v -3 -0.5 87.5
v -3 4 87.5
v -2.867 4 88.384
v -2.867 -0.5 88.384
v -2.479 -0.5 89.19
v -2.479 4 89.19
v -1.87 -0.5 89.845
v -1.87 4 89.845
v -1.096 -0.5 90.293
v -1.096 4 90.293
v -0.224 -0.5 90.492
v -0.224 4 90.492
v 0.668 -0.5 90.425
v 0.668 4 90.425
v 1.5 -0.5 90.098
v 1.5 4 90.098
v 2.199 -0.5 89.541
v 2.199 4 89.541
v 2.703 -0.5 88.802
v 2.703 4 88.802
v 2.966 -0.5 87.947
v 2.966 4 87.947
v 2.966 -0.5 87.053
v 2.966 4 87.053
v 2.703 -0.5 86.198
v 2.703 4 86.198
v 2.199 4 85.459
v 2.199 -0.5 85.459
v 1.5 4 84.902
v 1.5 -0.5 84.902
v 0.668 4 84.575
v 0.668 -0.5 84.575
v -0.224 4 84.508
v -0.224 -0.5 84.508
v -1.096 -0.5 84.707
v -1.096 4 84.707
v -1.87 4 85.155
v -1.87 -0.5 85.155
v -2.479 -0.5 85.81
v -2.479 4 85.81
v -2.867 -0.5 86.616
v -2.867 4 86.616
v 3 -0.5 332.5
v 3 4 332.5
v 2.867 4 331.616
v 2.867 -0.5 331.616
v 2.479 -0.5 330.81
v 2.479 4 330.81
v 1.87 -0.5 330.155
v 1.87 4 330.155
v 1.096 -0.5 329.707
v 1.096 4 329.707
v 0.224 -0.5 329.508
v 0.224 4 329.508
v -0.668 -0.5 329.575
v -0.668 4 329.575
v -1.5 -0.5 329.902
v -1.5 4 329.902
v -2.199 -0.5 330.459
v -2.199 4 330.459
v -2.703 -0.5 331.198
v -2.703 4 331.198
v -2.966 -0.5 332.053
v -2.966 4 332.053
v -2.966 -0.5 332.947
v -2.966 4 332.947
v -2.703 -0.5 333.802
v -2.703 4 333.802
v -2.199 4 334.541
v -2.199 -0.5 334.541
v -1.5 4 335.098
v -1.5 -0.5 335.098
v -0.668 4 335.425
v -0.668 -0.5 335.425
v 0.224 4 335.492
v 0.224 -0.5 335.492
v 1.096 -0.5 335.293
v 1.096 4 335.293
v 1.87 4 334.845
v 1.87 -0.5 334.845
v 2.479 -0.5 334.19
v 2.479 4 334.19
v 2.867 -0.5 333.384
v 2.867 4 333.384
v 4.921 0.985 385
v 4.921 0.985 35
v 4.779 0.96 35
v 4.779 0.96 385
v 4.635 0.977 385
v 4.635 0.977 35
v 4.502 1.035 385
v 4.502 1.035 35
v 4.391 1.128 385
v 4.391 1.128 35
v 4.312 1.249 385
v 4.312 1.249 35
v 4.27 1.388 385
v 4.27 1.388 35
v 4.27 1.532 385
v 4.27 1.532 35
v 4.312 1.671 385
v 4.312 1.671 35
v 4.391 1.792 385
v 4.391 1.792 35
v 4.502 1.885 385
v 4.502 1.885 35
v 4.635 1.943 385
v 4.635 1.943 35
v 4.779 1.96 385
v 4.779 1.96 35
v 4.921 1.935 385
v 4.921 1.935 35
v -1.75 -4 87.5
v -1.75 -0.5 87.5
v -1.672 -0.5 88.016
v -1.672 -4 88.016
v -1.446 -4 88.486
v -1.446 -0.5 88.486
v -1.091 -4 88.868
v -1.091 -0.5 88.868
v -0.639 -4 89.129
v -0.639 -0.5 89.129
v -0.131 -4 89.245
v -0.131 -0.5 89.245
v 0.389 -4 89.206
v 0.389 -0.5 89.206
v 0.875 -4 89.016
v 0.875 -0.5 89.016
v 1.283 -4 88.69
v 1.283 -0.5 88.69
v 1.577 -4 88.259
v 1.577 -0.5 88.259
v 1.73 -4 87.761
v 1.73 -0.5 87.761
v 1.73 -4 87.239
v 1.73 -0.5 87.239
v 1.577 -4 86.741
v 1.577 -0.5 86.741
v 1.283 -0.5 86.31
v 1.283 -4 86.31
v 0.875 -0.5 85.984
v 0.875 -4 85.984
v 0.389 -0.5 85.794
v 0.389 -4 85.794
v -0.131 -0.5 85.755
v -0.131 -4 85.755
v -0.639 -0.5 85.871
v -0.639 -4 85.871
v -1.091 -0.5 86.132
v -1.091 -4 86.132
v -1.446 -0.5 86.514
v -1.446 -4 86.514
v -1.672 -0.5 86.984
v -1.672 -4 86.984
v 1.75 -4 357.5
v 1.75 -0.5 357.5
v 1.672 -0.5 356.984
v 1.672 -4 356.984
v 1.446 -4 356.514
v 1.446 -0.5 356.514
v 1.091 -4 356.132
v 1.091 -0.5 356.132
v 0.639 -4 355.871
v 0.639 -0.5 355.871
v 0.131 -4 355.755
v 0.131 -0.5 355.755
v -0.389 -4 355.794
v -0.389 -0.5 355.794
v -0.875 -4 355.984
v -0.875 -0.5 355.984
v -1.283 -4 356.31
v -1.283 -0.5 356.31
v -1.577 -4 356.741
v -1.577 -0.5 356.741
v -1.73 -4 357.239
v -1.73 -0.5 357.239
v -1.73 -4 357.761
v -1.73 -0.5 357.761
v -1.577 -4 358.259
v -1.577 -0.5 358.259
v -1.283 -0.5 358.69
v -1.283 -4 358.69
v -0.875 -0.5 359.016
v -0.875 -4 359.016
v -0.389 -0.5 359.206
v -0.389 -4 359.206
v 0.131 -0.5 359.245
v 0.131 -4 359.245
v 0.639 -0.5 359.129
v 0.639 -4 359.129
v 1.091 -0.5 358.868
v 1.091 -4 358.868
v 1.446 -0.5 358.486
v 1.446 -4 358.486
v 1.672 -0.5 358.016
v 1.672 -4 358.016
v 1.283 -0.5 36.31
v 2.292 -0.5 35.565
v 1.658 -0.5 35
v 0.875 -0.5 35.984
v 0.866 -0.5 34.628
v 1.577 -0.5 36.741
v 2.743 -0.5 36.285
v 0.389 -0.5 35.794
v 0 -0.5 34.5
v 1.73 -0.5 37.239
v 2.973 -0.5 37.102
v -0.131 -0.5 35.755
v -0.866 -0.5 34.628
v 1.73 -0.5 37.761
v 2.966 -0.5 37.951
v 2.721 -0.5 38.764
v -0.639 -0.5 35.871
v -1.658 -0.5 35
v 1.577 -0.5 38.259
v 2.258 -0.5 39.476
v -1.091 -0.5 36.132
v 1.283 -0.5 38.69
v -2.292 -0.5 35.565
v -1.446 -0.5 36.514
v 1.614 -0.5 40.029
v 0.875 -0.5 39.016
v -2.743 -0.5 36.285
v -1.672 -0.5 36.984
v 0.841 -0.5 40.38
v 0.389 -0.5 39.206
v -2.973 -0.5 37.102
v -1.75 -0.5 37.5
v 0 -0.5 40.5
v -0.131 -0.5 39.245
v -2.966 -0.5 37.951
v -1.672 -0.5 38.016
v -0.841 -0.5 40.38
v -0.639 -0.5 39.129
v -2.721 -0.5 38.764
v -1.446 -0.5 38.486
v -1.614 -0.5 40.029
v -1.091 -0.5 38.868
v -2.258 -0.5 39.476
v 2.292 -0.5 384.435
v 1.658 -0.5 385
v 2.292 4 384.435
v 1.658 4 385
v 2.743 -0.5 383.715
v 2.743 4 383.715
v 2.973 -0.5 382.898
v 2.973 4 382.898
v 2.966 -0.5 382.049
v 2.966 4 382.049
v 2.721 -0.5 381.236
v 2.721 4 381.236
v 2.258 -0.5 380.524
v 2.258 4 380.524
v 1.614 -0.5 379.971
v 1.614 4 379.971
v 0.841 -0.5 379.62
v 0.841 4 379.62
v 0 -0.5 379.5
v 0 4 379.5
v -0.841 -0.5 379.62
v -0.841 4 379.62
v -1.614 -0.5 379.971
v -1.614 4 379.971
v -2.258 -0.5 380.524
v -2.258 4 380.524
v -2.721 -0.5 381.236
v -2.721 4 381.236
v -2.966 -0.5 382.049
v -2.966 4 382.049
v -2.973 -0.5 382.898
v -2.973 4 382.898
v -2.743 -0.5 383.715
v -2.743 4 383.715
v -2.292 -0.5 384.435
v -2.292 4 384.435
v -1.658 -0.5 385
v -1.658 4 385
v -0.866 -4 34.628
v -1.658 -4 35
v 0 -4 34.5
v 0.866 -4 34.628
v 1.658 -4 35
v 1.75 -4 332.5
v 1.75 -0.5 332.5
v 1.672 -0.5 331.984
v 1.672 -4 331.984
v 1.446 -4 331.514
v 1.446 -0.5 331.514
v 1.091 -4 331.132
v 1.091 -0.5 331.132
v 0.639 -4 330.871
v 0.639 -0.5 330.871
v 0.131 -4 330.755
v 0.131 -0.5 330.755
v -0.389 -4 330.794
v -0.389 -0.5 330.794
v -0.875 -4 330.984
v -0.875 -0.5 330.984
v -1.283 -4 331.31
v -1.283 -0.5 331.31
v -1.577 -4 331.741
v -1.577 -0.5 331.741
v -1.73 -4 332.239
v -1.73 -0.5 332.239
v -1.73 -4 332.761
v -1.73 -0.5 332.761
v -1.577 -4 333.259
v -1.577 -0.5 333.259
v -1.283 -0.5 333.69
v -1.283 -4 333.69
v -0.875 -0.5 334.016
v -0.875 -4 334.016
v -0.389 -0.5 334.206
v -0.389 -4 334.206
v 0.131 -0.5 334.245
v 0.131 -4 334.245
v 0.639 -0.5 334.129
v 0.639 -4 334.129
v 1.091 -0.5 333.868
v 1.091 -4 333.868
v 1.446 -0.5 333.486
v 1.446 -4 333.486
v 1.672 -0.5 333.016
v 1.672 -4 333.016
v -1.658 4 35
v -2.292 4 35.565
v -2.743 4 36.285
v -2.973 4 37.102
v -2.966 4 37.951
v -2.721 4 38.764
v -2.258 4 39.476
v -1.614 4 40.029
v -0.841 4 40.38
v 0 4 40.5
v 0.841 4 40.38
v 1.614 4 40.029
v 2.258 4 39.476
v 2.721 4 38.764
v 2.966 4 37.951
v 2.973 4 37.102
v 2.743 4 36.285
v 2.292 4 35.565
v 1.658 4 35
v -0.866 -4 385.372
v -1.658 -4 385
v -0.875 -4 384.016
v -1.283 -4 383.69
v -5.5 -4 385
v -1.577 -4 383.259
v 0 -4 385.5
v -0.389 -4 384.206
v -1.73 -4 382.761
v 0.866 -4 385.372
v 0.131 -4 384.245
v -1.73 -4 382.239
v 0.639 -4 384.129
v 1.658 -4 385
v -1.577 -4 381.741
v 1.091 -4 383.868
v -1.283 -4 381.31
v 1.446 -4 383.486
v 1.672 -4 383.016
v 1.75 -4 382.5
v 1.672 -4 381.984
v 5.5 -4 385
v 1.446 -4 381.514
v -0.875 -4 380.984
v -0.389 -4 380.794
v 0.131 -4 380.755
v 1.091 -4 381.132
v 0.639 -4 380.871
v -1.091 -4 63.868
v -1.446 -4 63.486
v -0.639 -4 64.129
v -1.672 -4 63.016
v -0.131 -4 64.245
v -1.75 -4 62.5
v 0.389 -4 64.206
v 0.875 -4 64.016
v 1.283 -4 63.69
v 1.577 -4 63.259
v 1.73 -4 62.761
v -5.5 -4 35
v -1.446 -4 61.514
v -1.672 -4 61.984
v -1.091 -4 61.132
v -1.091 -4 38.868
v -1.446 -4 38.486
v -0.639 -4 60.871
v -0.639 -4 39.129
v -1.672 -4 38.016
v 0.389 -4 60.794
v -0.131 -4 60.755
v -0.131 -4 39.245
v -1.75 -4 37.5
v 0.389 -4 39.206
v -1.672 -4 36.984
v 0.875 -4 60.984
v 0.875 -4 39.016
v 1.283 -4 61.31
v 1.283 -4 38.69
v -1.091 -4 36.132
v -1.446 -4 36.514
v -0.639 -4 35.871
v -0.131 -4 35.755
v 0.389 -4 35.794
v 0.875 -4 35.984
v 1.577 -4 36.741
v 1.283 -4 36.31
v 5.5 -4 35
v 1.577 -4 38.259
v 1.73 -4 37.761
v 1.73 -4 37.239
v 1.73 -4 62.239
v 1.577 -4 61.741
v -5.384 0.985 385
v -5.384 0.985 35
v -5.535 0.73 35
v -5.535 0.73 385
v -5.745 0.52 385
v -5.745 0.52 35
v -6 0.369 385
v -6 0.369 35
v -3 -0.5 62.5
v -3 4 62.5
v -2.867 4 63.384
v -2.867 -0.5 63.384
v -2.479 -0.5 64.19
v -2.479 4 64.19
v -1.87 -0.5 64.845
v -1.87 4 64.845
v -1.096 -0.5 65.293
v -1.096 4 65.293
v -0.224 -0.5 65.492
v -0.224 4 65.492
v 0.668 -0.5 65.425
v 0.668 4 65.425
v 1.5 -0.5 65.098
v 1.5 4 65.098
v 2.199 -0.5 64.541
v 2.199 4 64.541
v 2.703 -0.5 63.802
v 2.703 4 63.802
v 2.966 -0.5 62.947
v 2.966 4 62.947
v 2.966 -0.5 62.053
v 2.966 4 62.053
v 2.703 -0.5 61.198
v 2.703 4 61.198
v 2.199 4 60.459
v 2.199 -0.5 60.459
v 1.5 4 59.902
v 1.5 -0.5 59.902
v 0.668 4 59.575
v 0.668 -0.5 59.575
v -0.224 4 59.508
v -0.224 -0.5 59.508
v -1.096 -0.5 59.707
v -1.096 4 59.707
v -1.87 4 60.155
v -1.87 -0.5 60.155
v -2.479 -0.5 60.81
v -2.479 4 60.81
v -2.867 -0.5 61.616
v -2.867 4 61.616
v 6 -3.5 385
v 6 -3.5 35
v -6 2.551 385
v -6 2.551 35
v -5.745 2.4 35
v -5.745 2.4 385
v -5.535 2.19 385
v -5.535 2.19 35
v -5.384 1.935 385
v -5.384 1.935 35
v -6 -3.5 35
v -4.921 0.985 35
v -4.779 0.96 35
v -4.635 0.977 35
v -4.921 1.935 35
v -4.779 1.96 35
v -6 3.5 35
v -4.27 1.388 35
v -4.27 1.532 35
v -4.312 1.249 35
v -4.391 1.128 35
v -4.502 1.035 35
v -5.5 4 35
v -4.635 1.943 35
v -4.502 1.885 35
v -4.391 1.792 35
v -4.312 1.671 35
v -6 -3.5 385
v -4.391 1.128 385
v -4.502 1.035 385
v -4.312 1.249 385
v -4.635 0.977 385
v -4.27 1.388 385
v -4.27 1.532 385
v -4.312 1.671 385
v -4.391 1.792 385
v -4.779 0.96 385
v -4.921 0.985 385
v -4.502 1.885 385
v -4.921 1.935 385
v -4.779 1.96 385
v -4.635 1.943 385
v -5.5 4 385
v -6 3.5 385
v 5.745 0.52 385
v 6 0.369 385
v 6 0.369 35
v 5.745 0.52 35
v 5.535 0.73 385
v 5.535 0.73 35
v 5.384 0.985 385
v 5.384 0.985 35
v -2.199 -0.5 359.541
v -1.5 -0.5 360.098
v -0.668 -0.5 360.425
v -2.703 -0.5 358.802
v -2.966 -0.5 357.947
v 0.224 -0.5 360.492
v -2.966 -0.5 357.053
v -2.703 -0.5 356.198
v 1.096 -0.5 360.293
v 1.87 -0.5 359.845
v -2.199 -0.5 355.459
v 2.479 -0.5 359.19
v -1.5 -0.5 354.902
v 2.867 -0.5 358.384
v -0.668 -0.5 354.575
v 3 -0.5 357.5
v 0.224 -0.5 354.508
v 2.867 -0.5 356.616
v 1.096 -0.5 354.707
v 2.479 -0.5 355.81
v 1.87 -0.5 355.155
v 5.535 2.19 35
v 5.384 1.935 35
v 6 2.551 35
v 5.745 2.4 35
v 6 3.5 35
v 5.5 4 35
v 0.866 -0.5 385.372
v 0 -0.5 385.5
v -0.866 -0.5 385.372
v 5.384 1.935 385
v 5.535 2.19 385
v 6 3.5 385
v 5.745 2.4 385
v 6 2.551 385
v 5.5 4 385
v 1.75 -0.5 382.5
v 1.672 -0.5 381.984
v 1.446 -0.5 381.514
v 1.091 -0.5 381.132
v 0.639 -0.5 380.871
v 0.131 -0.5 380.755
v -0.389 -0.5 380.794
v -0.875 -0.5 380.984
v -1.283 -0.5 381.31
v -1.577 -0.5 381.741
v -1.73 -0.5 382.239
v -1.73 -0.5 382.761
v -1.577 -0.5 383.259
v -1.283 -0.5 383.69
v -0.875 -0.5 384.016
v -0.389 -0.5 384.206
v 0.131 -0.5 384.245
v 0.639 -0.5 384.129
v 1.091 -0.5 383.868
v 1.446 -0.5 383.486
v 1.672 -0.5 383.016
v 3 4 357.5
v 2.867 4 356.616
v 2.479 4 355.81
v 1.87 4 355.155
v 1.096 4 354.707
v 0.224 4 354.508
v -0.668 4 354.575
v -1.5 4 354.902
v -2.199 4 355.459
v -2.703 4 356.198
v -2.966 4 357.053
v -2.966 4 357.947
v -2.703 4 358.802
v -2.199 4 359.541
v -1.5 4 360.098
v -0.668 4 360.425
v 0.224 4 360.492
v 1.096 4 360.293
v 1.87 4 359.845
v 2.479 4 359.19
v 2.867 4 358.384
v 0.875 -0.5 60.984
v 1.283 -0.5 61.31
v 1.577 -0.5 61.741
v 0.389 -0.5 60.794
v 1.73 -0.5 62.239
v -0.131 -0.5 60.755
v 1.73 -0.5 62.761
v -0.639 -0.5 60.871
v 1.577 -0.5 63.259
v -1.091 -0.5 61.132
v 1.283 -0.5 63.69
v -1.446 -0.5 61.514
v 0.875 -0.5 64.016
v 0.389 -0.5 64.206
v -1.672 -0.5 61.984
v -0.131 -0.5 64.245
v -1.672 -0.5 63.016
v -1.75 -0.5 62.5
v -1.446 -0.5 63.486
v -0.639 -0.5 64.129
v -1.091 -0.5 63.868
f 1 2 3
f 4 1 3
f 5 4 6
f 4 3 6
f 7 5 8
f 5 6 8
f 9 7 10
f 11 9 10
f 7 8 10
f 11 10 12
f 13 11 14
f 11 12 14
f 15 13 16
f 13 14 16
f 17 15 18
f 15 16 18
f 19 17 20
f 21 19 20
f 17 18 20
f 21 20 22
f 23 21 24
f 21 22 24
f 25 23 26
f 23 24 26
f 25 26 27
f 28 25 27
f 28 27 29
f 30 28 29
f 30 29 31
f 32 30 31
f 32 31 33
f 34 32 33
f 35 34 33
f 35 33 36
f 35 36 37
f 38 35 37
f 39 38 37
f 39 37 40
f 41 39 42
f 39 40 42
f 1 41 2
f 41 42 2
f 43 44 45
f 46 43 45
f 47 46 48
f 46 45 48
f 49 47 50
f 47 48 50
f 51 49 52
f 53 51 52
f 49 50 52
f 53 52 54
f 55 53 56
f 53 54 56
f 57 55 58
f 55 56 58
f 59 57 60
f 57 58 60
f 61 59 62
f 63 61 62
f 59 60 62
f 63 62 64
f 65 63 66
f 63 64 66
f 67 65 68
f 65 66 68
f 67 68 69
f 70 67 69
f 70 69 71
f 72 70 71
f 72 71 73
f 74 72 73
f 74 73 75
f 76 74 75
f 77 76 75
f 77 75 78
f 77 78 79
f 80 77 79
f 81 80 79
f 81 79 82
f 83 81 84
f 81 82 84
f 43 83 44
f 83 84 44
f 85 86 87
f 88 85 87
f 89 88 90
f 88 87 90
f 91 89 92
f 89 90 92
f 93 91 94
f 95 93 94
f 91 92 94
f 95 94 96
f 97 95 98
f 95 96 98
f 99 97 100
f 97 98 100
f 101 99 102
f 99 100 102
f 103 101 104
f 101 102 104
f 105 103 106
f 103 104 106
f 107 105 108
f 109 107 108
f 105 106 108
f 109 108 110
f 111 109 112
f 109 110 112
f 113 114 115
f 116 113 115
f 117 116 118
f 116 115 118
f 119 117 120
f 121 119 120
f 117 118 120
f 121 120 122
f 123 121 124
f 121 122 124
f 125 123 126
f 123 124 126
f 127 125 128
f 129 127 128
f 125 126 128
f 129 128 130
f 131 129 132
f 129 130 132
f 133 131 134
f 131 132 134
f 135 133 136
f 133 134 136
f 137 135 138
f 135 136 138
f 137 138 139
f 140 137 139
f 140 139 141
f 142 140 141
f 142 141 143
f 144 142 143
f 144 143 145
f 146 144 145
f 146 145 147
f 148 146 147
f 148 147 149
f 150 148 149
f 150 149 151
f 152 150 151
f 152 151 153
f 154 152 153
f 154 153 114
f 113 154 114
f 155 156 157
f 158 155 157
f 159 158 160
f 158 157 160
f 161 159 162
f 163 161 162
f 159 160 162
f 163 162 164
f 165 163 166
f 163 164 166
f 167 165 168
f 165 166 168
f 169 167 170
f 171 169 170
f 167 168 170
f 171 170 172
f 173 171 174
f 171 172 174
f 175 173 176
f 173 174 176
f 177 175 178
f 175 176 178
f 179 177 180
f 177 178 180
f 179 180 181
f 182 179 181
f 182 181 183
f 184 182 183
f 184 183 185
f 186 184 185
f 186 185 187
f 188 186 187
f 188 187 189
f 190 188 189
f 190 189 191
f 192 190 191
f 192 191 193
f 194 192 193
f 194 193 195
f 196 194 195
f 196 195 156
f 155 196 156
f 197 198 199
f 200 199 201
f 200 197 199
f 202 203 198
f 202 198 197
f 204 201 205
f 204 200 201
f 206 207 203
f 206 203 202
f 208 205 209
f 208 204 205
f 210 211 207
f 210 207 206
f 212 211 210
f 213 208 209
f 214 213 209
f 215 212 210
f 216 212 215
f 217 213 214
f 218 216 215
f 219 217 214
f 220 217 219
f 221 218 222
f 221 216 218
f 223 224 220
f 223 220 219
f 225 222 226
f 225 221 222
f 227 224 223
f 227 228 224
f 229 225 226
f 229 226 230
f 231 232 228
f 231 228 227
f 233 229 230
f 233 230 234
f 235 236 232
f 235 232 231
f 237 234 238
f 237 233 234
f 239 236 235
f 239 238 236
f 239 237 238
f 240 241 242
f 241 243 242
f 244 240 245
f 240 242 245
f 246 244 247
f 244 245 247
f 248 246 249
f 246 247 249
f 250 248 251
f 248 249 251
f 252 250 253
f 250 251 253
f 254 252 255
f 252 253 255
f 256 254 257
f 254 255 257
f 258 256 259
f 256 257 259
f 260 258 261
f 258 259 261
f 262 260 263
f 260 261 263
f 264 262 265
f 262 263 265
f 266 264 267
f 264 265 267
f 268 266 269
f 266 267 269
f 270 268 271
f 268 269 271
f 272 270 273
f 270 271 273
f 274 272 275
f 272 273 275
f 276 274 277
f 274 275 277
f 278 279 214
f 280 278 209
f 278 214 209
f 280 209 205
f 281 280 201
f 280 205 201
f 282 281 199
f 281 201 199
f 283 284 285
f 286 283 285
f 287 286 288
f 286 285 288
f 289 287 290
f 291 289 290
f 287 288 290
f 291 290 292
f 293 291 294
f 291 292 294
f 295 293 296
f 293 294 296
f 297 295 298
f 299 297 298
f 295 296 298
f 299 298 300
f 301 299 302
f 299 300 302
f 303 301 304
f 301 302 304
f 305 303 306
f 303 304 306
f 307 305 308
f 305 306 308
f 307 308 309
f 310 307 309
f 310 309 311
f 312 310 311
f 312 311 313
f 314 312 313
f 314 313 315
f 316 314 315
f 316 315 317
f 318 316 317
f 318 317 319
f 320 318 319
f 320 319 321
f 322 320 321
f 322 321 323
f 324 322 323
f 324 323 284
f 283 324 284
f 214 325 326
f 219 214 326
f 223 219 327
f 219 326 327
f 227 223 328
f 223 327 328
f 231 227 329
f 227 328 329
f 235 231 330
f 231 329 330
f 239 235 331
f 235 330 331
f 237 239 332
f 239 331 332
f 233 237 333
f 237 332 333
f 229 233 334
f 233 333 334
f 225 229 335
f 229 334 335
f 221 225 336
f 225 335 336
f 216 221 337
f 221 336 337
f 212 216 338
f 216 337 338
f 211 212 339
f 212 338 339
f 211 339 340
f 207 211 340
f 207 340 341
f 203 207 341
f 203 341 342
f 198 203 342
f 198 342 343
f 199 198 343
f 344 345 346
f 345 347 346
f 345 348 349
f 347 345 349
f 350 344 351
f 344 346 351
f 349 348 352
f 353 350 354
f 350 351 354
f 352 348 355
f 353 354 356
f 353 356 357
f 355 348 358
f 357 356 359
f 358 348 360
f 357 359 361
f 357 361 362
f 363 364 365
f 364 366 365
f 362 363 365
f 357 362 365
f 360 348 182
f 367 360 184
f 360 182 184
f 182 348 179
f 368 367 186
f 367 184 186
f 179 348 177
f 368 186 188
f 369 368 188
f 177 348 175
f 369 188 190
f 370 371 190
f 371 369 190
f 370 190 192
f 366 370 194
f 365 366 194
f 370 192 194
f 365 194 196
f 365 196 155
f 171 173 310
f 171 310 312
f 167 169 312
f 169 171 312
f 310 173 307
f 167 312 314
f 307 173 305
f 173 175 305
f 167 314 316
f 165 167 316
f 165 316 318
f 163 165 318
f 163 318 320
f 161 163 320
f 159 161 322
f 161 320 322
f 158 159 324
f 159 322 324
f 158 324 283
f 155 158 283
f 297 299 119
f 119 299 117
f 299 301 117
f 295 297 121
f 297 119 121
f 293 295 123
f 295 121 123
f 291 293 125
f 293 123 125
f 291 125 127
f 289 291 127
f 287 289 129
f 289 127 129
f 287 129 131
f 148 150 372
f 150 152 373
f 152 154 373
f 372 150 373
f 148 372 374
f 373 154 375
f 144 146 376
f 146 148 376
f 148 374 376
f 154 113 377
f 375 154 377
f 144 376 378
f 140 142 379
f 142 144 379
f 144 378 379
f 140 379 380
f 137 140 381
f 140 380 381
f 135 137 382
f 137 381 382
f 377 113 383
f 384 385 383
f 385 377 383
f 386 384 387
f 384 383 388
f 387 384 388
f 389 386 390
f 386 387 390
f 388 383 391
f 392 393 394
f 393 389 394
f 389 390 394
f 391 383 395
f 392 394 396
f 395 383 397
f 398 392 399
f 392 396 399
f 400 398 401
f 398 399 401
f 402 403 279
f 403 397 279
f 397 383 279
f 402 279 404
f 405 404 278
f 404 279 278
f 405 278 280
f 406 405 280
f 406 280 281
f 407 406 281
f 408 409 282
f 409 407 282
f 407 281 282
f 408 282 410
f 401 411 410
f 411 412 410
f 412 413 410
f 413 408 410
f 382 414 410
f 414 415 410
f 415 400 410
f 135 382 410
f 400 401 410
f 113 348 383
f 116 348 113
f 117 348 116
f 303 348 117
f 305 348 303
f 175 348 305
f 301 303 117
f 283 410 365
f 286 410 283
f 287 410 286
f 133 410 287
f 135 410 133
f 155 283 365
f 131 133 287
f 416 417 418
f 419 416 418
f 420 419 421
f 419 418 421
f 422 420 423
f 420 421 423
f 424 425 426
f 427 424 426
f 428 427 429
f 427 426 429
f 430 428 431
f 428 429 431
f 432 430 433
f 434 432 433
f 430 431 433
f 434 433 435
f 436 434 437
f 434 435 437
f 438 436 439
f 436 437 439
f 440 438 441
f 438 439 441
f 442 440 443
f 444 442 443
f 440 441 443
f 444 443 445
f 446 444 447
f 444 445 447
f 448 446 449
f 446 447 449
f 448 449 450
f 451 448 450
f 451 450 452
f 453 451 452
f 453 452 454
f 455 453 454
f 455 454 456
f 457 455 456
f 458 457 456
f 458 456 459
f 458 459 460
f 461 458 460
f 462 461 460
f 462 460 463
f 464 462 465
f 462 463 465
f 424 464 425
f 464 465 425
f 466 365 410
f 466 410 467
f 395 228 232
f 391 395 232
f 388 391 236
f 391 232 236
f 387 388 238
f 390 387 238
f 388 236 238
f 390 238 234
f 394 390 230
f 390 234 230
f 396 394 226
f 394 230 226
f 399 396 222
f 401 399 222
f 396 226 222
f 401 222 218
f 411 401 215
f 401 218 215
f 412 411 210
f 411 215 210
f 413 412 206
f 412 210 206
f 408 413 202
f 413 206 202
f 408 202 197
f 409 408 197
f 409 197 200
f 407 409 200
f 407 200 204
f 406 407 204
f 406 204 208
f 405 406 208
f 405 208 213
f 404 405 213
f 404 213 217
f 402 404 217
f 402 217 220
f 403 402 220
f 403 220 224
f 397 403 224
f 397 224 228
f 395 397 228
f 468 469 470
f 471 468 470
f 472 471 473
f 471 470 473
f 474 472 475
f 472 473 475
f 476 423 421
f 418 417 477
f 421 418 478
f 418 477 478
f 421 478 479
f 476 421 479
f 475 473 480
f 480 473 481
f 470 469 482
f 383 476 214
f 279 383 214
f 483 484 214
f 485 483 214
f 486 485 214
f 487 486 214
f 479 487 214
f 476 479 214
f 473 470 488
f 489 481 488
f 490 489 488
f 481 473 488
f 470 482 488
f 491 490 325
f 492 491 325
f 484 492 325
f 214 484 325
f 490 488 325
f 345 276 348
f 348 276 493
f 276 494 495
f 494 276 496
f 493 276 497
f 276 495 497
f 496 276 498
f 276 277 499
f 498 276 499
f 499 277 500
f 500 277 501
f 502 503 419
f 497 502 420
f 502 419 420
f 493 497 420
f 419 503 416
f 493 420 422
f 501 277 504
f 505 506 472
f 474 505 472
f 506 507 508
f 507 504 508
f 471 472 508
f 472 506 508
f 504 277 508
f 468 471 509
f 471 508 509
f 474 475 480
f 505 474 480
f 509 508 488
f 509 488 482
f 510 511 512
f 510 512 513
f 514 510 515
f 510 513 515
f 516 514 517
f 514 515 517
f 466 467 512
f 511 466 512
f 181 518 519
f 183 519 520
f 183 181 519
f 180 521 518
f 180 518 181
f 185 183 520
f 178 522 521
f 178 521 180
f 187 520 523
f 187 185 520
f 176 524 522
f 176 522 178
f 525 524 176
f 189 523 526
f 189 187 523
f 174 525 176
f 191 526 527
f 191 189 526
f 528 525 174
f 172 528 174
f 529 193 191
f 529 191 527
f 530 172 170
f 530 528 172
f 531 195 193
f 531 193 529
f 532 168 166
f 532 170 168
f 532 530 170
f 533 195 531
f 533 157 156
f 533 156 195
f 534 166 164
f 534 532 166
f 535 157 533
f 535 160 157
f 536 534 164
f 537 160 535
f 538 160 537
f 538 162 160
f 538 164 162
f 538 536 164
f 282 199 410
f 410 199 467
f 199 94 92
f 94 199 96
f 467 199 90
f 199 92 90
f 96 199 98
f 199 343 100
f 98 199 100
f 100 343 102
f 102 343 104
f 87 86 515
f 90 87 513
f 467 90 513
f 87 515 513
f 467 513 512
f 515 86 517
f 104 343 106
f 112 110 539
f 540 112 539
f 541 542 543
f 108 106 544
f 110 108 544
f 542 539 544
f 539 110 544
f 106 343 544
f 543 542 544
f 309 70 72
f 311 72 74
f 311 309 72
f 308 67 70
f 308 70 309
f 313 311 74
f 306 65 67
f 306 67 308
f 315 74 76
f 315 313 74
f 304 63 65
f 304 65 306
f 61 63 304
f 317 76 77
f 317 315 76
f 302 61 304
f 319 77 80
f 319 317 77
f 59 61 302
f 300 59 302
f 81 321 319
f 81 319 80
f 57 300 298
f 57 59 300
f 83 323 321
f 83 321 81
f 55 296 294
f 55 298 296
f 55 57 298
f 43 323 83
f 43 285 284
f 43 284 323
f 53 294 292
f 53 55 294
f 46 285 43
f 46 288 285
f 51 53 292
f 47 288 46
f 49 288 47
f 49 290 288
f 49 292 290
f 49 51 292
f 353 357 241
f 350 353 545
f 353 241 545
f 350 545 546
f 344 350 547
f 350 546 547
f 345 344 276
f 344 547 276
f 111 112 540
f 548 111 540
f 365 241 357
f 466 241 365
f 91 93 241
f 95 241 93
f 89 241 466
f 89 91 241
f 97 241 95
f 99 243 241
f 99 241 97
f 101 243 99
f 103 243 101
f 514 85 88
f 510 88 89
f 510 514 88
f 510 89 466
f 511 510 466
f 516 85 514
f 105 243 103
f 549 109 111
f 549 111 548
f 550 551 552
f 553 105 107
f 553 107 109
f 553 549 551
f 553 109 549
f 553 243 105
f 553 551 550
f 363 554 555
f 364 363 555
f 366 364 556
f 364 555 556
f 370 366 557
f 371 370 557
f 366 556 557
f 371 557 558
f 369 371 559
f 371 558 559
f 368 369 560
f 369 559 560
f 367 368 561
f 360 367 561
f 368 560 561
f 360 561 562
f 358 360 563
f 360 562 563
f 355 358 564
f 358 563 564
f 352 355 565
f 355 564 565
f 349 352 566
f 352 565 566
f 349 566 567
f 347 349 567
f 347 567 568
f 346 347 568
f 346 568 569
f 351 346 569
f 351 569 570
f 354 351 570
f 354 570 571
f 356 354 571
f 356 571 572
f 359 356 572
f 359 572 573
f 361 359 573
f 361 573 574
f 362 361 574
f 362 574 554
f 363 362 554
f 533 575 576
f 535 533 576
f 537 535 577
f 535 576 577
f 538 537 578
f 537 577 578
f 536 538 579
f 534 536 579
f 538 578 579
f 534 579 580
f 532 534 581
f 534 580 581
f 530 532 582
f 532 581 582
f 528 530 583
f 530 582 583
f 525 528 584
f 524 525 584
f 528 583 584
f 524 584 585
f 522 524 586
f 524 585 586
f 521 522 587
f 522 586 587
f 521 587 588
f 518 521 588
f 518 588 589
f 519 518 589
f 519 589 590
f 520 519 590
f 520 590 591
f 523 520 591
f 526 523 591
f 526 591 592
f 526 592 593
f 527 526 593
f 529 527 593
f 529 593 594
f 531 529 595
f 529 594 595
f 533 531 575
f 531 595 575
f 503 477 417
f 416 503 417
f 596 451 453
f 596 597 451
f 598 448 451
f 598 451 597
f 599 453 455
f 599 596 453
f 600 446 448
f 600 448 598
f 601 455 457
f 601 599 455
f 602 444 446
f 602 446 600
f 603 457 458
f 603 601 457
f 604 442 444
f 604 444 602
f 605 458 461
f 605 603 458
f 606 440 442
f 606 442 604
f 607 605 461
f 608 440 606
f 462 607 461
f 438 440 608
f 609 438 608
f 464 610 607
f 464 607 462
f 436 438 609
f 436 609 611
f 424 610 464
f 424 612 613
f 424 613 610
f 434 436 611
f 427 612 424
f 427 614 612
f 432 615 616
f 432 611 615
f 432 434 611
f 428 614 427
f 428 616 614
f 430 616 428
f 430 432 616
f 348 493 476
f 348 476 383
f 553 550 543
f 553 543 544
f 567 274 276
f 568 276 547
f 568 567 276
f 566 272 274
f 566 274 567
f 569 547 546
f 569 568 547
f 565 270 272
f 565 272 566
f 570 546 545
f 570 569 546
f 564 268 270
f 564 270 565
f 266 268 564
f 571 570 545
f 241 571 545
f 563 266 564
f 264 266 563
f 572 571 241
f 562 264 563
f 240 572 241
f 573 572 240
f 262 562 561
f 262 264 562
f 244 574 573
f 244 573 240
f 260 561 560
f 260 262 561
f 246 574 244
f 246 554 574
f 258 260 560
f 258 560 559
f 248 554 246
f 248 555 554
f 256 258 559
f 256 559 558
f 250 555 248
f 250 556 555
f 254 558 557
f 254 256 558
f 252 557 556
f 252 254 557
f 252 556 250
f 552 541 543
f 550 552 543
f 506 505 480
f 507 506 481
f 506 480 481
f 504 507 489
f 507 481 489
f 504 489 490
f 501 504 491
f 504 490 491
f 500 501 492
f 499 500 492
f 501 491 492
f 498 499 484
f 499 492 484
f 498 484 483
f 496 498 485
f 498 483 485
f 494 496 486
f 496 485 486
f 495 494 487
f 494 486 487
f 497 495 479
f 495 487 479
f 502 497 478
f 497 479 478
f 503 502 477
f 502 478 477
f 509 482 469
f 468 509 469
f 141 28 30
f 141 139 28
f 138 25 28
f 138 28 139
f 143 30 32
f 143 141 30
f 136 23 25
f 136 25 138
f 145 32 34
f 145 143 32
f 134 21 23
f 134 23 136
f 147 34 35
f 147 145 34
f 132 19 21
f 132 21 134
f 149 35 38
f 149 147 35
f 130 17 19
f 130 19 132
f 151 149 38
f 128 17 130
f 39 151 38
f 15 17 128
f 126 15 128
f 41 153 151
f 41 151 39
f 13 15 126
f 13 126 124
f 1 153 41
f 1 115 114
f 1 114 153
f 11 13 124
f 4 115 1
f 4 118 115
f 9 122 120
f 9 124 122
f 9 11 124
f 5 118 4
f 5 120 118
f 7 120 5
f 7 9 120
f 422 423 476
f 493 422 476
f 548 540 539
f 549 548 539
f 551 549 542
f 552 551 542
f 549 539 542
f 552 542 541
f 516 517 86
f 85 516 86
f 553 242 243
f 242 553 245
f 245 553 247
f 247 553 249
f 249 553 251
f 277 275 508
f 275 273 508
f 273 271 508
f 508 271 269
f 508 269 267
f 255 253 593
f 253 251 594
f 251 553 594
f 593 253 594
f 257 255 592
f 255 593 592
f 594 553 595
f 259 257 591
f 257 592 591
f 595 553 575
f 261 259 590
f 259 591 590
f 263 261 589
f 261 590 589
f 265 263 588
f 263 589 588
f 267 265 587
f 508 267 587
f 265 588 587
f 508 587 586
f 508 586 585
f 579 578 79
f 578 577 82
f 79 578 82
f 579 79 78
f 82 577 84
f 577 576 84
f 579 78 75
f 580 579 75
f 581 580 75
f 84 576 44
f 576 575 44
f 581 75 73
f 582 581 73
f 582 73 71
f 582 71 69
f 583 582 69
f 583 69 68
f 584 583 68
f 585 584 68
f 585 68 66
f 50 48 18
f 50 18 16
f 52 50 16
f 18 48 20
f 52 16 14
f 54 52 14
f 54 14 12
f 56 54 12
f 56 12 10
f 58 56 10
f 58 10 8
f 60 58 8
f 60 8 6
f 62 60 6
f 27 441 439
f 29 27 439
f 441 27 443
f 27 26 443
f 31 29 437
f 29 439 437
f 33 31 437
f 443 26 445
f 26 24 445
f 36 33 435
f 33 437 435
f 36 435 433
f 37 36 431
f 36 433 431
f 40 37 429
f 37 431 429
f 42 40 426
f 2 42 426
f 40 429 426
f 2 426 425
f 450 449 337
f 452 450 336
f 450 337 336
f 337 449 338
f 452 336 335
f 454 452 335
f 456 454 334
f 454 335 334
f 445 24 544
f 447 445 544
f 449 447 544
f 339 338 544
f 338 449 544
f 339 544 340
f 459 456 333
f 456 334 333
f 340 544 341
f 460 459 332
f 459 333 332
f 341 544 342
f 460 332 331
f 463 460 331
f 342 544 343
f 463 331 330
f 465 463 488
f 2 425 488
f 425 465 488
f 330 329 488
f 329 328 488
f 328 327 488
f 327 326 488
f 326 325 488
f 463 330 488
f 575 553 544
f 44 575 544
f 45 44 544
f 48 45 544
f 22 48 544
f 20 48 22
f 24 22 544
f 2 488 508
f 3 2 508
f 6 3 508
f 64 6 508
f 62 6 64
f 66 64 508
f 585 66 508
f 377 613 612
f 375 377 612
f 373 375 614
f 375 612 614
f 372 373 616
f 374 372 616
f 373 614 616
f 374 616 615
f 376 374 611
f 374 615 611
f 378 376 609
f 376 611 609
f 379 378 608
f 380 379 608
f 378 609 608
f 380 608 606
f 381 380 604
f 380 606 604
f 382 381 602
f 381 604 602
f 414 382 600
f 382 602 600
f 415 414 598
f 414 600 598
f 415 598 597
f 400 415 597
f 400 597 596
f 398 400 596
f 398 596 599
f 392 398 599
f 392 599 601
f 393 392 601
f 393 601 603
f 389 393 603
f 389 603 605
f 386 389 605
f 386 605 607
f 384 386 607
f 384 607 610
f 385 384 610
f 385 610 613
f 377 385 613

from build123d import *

# Parameters (mm, degrees)
BOSS_EXTRUDE1_DEPTH     = 420
SKETCH2_R               = 3
CUT_EXTRUDE1_DEPTH      = 4.5
SKETCH3_R               = 1.75
CUT_EXTRUDE2_DEPTH      = 421.066958948
LPATTERN1_COUNT         = 4
LPATTERN1_PITCH         = 25
MIRROR1_COPY_1_SKETCH_R = 3
MIRROR1_COPY_1_DEPTH    = 4.5
MIRROR1_COPY_2_SKETCH_R = 3
MIRROR1_COPY_2_DEPTH    = 4.5
MIRROR1_COPY_3_SKETCH_R = 3
MIRROR1_COPY_3_DEPTH    = 4.5
MIRROR1_COPY_4_SKETCH_R = 1.75
MIRROR1_COPY_4_DEPTH    = 421.066958948
MIRROR1_COPY_5_SKETCH_R = 1.75
MIRROR1_COPY_5_DEPTH    = 421.066958948
MIRROR1_COPY_6_SKETCH_R = 1.75
MIRROR1_COPY_6_DEPTH    = 421.066958948
SKETCH5_R               = 3
SKETCH5_W               = 0.5
SKETCH5_H               = 35
CUT_EXTRUDE3_DEPTH      = 421.119030752


with BuildPart() as part:
    # Sketch1 → Boss-Extrude1 (new body)
    with BuildSketch(Plane.XY):
        with BuildLine():
            Line((6, -3.5), (6, 0.368911094))
            ThreePointArc((6, 0.368911094), (5.63354293, 0.61854293), (5.383911094, 0.985))
            Line((5.383911094, 0.985), (4.92112495, 0.985))
            ThreePointArc((4.92112495, 0.985), (4.265, 1.46), (4.92112495, 1.935))
            Line((4.92112495, 1.935), (5.383911094, 1.935))
            ThreePointArc((5.383911094, 1.935), (5.63354293, 2.30145707), (6, 2.551088906))
            Line((6, 2.551088906), (6, 3.5))
            Line((6, 3.5), (5.5, 4))
            Line((5.5, 4), (-5.5, 4))
            Line((-5.5, 4), (-6, 3.5))
            Line((-6, 3.5), (-6, 2.551088906))
            ThreePointArc((-6, 2.551088906), (-5.63354293, 2.30145707), (-5.383911094, 1.935))
            Line((-5.383911094, 1.935), (-4.92112495, 1.935))
            ThreePointArc((-4.92112495, 1.935), (-4.265, 1.46), (-4.92112495, 0.985))
            Line((-4.92112495, 0.985), (-5.383911094, 0.985))
            ThreePointArc((-5.383911094, 0.985), (-5.63354293, 0.61854293), (-6, 0.368911094))
            Line((-6, 0.368911094), (-6, -3.5))
            Line((-6, -3.5), (-5.5, -4))
            Line((-5.5, -4), (5.5, -4))
            Line((5.5, -4), (6, -3.5))
        make_face()
    extrude(amount=BOSS_EXTRUDE1_DEPTH)

    # Sketch2 → Cut-Extrude1 (cut)
    with BuildSketch(Plane(origin=(0, 4, 0), x_dir=(1, 0, 0), z_dir=(0, 1, 0))):
        with Locations(Location((0, -12.5, 0), (0, 0, 180))):
            Circle(SKETCH2_R)
    cut_extrude1 = extrude(amount=-CUT_EXTRUDE1_DEPTH, mode=Mode.SUBTRACT)

    # Sketch3 → Cut-Extrude2 (cut, through all)
    with BuildSketch(Plane(origin=(0, -0.5, 0), x_dir=(1, 0, 0), z_dir=(0, 1, 0))):
        with Locations(Location((0, -12.5, 0), (0, 0, 180))):
            Circle(SKETCH3_R)
    cut_extrude2 = extrude(amount=-CUT_EXTRUDE2_DEPTH, mode=Mode.SUBTRACT)

    # LPattern1: Cut-Extrude1, Cut-Extrude2 ×4
    with Locations(*[(0, 0, i * LPATTERN1_PITCH) for i in range(1, LPATTERN1_COUNT)]):
        add(cut_extrude1, mode=Mode.SUBTRACT)
        add(cut_extrude2, mode=Mode.SUBTRACT)

    # Mirror1: Cut-Extrude1, Cut-Extrude2 across plane
    add(cut_extrude1.mirror(Plane.XY.offset(210)), mode=Mode.SUBTRACT)
    add(cut_extrude2.mirror(Plane.XY.offset(210)), mode=Mode.SUBTRACT)

    # Mirror1 copy 1 sketch → Mirror1 copy 1 (cut)
    with BuildSketch(Plane(origin=(0, 4, 395), x_dir=(1, 0, 0), z_dir=(0, 1, 0))):
        with Locations((0, 12.5)):
            Circle(MIRROR1_COPY_1_SKETCH_R)
    extrude(amount=-MIRROR1_COPY_1_DEPTH, mode=Mode.SUBTRACT)

    # Mirror1 copy 2 sketch → Mirror1 copy 2 (cut)
    with BuildSketch(Plane(origin=(0, 4, 370), x_dir=(1, 0, 0), z_dir=(0, 1, 0))):
        with Locations((0, 12.5)):
            Circle(MIRROR1_COPY_2_SKETCH_R)
    extrude(amount=-MIRROR1_COPY_2_DEPTH, mode=Mode.SUBTRACT)

    # Mirror1 copy 3 sketch → Mirror1 copy 3 (cut)
    with BuildSketch(Plane(origin=(0, 4, 345), x_dir=(1, 0, 0), z_dir=(0, 1, 0))):
        with Locations((0, 12.5)):
            Circle(MIRROR1_COPY_3_SKETCH_R)
    extrude(amount=-MIRROR1_COPY_3_DEPTH, mode=Mode.SUBTRACT)

    # Mirror1 copy 4 sketch → Mirror1 copy 4 (cut, through all)
    with BuildSketch(Plane(origin=(0, -0.5, 395), x_dir=(1, 0, 0), z_dir=(0, 1, 0))):
        with Locations((0, 12.5)):
            Circle(MIRROR1_COPY_4_SKETCH_R)
    extrude(amount=-MIRROR1_COPY_4_DEPTH, mode=Mode.SUBTRACT)

    # Mirror1 copy 5 sketch → Mirror1 copy 5 (cut, through all)
    with BuildSketch(Plane(origin=(0, -0.5, 370), x_dir=(1, 0, 0), z_dir=(0, 1, 0))):
        with Locations((0, 12.5)):
            Circle(MIRROR1_COPY_5_SKETCH_R)
    extrude(amount=-MIRROR1_COPY_5_DEPTH, mode=Mode.SUBTRACT)

    # Mirror1 copy 6 sketch → Mirror1 copy 6 (cut, through all)
    with BuildSketch(Plane(origin=(0, -0.5, 345), x_dir=(1, 0, 0), z_dir=(0, 1, 0))):
        with Locations((0, 12.5)):
            Circle(MIRROR1_COPY_6_SKETCH_R)
    extrude(amount=-MIRROR1_COPY_6_DEPTH, mode=Mode.SUBTRACT)

    # Sketch5 → Cut-Extrude3 (cut, through all)
    # profile 1 of 8: a face of its own
    with BuildSketch(Plane(origin=(0, 4, 0), x_dir=(1, 0, 0), z_dir=(0, 1, 0))):
        with BuildLine():
            Line((-1.658312395, -385), (-5.5, -385))
            Line((-5.5, -385), (-5.5, -420))
            Line((-5.5, -420), (5.5, -420))
            Line((5.5, -420), (5.5, -385))
            Line((5.5, -385), (1.658312395, -385))
            ThreePointArc((1.658312395, -385), (0, -385.5), (-1.658312395, -385))
        make_face()
        with Locations((0, -407.5)):
            Circle(SKETCH5_R, mode=Mode.SUBTRACT)
    # profile 2 of 8: a face of its own
    with BuildSketch(Plane(origin=(0, 4, 0), x_dir=(1, 0, 0), z_dir=(0, 1, 0))):
        with Locations((-5.75, -402.5)):
            Rectangle(SKETCH5_W, SKETCH5_H)
    # profile 3 of 8: a face of its own
    with BuildSketch(Plane(origin=(0, 4, 0), x_dir=(1, 0, 0), z_dir=(0, 1, 0))):
        with Locations((5.75, -402.5)):
            Rectangle(SKETCH5_W, SKETCH5_H)
    # profile 4 of 8: a face of its own
    with BuildSketch(Plane(origin=(0, 4, 0), x_dir=(1, 0, 0), z_dir=(0, 1, 0))):
        with Locations((0, -407.5)):
            Circle(SKETCH5_R)
    # profile 5 of 8: a face of its own
    with BuildSketch(Plane(origin=(0, 4, 0), x_dir=(1, 0, 0), z_dir=(0, 1, 0))):
        with BuildLine():
            Line((-5.5, 0), (-5.5, -35))
            Line((-5.5, -35), (-1.658312395, -35))
            ThreePointArc((-1.658312395, -35), (0, -34.5), (1.658312395, -35))
            Line((1.658312395, -35), (5.5, -35))
            Line((5.5, -35), (5.5, 0))
            Line((5.5, 0), (-5.5, 0))
        make_face()
        with Locations((0, -12.5)):
            Circle(SKETCH5_R, mode=Mode.SUBTRACT)
    # profile 6 of 8: a face of its own
    with BuildSketch(Plane(origin=(0, 4, 0), x_dir=(1, 0, 0), z_dir=(0, 1, 0))):
        with Locations((0, -12.5)):
            Circle(SKETCH5_R)
    # profile 7 of 8: a face of its own
    with BuildSketch(Plane(origin=(0, 4, 0), x_dir=(1, 0, 0), z_dir=(0, 1, 0))):
        with Locations((5.75, -17.5)):
            Rectangle(SKETCH5_W, SKETCH5_H)
    # profile 8 of 8: a face of its own
    with BuildSketch(Plane(origin=(0, 4, 0), x_dir=(1, 0, 0), z_dir=(0, 1, 0))):
        with Locations((-5.75, -17.5)):
            Rectangle(SKETCH5_W, SKETCH5_H)
    extrude(amount=-CUT_EXTRUDE3_DEPTH, mode=Mode.SUBTRACT)


solid = part.part
